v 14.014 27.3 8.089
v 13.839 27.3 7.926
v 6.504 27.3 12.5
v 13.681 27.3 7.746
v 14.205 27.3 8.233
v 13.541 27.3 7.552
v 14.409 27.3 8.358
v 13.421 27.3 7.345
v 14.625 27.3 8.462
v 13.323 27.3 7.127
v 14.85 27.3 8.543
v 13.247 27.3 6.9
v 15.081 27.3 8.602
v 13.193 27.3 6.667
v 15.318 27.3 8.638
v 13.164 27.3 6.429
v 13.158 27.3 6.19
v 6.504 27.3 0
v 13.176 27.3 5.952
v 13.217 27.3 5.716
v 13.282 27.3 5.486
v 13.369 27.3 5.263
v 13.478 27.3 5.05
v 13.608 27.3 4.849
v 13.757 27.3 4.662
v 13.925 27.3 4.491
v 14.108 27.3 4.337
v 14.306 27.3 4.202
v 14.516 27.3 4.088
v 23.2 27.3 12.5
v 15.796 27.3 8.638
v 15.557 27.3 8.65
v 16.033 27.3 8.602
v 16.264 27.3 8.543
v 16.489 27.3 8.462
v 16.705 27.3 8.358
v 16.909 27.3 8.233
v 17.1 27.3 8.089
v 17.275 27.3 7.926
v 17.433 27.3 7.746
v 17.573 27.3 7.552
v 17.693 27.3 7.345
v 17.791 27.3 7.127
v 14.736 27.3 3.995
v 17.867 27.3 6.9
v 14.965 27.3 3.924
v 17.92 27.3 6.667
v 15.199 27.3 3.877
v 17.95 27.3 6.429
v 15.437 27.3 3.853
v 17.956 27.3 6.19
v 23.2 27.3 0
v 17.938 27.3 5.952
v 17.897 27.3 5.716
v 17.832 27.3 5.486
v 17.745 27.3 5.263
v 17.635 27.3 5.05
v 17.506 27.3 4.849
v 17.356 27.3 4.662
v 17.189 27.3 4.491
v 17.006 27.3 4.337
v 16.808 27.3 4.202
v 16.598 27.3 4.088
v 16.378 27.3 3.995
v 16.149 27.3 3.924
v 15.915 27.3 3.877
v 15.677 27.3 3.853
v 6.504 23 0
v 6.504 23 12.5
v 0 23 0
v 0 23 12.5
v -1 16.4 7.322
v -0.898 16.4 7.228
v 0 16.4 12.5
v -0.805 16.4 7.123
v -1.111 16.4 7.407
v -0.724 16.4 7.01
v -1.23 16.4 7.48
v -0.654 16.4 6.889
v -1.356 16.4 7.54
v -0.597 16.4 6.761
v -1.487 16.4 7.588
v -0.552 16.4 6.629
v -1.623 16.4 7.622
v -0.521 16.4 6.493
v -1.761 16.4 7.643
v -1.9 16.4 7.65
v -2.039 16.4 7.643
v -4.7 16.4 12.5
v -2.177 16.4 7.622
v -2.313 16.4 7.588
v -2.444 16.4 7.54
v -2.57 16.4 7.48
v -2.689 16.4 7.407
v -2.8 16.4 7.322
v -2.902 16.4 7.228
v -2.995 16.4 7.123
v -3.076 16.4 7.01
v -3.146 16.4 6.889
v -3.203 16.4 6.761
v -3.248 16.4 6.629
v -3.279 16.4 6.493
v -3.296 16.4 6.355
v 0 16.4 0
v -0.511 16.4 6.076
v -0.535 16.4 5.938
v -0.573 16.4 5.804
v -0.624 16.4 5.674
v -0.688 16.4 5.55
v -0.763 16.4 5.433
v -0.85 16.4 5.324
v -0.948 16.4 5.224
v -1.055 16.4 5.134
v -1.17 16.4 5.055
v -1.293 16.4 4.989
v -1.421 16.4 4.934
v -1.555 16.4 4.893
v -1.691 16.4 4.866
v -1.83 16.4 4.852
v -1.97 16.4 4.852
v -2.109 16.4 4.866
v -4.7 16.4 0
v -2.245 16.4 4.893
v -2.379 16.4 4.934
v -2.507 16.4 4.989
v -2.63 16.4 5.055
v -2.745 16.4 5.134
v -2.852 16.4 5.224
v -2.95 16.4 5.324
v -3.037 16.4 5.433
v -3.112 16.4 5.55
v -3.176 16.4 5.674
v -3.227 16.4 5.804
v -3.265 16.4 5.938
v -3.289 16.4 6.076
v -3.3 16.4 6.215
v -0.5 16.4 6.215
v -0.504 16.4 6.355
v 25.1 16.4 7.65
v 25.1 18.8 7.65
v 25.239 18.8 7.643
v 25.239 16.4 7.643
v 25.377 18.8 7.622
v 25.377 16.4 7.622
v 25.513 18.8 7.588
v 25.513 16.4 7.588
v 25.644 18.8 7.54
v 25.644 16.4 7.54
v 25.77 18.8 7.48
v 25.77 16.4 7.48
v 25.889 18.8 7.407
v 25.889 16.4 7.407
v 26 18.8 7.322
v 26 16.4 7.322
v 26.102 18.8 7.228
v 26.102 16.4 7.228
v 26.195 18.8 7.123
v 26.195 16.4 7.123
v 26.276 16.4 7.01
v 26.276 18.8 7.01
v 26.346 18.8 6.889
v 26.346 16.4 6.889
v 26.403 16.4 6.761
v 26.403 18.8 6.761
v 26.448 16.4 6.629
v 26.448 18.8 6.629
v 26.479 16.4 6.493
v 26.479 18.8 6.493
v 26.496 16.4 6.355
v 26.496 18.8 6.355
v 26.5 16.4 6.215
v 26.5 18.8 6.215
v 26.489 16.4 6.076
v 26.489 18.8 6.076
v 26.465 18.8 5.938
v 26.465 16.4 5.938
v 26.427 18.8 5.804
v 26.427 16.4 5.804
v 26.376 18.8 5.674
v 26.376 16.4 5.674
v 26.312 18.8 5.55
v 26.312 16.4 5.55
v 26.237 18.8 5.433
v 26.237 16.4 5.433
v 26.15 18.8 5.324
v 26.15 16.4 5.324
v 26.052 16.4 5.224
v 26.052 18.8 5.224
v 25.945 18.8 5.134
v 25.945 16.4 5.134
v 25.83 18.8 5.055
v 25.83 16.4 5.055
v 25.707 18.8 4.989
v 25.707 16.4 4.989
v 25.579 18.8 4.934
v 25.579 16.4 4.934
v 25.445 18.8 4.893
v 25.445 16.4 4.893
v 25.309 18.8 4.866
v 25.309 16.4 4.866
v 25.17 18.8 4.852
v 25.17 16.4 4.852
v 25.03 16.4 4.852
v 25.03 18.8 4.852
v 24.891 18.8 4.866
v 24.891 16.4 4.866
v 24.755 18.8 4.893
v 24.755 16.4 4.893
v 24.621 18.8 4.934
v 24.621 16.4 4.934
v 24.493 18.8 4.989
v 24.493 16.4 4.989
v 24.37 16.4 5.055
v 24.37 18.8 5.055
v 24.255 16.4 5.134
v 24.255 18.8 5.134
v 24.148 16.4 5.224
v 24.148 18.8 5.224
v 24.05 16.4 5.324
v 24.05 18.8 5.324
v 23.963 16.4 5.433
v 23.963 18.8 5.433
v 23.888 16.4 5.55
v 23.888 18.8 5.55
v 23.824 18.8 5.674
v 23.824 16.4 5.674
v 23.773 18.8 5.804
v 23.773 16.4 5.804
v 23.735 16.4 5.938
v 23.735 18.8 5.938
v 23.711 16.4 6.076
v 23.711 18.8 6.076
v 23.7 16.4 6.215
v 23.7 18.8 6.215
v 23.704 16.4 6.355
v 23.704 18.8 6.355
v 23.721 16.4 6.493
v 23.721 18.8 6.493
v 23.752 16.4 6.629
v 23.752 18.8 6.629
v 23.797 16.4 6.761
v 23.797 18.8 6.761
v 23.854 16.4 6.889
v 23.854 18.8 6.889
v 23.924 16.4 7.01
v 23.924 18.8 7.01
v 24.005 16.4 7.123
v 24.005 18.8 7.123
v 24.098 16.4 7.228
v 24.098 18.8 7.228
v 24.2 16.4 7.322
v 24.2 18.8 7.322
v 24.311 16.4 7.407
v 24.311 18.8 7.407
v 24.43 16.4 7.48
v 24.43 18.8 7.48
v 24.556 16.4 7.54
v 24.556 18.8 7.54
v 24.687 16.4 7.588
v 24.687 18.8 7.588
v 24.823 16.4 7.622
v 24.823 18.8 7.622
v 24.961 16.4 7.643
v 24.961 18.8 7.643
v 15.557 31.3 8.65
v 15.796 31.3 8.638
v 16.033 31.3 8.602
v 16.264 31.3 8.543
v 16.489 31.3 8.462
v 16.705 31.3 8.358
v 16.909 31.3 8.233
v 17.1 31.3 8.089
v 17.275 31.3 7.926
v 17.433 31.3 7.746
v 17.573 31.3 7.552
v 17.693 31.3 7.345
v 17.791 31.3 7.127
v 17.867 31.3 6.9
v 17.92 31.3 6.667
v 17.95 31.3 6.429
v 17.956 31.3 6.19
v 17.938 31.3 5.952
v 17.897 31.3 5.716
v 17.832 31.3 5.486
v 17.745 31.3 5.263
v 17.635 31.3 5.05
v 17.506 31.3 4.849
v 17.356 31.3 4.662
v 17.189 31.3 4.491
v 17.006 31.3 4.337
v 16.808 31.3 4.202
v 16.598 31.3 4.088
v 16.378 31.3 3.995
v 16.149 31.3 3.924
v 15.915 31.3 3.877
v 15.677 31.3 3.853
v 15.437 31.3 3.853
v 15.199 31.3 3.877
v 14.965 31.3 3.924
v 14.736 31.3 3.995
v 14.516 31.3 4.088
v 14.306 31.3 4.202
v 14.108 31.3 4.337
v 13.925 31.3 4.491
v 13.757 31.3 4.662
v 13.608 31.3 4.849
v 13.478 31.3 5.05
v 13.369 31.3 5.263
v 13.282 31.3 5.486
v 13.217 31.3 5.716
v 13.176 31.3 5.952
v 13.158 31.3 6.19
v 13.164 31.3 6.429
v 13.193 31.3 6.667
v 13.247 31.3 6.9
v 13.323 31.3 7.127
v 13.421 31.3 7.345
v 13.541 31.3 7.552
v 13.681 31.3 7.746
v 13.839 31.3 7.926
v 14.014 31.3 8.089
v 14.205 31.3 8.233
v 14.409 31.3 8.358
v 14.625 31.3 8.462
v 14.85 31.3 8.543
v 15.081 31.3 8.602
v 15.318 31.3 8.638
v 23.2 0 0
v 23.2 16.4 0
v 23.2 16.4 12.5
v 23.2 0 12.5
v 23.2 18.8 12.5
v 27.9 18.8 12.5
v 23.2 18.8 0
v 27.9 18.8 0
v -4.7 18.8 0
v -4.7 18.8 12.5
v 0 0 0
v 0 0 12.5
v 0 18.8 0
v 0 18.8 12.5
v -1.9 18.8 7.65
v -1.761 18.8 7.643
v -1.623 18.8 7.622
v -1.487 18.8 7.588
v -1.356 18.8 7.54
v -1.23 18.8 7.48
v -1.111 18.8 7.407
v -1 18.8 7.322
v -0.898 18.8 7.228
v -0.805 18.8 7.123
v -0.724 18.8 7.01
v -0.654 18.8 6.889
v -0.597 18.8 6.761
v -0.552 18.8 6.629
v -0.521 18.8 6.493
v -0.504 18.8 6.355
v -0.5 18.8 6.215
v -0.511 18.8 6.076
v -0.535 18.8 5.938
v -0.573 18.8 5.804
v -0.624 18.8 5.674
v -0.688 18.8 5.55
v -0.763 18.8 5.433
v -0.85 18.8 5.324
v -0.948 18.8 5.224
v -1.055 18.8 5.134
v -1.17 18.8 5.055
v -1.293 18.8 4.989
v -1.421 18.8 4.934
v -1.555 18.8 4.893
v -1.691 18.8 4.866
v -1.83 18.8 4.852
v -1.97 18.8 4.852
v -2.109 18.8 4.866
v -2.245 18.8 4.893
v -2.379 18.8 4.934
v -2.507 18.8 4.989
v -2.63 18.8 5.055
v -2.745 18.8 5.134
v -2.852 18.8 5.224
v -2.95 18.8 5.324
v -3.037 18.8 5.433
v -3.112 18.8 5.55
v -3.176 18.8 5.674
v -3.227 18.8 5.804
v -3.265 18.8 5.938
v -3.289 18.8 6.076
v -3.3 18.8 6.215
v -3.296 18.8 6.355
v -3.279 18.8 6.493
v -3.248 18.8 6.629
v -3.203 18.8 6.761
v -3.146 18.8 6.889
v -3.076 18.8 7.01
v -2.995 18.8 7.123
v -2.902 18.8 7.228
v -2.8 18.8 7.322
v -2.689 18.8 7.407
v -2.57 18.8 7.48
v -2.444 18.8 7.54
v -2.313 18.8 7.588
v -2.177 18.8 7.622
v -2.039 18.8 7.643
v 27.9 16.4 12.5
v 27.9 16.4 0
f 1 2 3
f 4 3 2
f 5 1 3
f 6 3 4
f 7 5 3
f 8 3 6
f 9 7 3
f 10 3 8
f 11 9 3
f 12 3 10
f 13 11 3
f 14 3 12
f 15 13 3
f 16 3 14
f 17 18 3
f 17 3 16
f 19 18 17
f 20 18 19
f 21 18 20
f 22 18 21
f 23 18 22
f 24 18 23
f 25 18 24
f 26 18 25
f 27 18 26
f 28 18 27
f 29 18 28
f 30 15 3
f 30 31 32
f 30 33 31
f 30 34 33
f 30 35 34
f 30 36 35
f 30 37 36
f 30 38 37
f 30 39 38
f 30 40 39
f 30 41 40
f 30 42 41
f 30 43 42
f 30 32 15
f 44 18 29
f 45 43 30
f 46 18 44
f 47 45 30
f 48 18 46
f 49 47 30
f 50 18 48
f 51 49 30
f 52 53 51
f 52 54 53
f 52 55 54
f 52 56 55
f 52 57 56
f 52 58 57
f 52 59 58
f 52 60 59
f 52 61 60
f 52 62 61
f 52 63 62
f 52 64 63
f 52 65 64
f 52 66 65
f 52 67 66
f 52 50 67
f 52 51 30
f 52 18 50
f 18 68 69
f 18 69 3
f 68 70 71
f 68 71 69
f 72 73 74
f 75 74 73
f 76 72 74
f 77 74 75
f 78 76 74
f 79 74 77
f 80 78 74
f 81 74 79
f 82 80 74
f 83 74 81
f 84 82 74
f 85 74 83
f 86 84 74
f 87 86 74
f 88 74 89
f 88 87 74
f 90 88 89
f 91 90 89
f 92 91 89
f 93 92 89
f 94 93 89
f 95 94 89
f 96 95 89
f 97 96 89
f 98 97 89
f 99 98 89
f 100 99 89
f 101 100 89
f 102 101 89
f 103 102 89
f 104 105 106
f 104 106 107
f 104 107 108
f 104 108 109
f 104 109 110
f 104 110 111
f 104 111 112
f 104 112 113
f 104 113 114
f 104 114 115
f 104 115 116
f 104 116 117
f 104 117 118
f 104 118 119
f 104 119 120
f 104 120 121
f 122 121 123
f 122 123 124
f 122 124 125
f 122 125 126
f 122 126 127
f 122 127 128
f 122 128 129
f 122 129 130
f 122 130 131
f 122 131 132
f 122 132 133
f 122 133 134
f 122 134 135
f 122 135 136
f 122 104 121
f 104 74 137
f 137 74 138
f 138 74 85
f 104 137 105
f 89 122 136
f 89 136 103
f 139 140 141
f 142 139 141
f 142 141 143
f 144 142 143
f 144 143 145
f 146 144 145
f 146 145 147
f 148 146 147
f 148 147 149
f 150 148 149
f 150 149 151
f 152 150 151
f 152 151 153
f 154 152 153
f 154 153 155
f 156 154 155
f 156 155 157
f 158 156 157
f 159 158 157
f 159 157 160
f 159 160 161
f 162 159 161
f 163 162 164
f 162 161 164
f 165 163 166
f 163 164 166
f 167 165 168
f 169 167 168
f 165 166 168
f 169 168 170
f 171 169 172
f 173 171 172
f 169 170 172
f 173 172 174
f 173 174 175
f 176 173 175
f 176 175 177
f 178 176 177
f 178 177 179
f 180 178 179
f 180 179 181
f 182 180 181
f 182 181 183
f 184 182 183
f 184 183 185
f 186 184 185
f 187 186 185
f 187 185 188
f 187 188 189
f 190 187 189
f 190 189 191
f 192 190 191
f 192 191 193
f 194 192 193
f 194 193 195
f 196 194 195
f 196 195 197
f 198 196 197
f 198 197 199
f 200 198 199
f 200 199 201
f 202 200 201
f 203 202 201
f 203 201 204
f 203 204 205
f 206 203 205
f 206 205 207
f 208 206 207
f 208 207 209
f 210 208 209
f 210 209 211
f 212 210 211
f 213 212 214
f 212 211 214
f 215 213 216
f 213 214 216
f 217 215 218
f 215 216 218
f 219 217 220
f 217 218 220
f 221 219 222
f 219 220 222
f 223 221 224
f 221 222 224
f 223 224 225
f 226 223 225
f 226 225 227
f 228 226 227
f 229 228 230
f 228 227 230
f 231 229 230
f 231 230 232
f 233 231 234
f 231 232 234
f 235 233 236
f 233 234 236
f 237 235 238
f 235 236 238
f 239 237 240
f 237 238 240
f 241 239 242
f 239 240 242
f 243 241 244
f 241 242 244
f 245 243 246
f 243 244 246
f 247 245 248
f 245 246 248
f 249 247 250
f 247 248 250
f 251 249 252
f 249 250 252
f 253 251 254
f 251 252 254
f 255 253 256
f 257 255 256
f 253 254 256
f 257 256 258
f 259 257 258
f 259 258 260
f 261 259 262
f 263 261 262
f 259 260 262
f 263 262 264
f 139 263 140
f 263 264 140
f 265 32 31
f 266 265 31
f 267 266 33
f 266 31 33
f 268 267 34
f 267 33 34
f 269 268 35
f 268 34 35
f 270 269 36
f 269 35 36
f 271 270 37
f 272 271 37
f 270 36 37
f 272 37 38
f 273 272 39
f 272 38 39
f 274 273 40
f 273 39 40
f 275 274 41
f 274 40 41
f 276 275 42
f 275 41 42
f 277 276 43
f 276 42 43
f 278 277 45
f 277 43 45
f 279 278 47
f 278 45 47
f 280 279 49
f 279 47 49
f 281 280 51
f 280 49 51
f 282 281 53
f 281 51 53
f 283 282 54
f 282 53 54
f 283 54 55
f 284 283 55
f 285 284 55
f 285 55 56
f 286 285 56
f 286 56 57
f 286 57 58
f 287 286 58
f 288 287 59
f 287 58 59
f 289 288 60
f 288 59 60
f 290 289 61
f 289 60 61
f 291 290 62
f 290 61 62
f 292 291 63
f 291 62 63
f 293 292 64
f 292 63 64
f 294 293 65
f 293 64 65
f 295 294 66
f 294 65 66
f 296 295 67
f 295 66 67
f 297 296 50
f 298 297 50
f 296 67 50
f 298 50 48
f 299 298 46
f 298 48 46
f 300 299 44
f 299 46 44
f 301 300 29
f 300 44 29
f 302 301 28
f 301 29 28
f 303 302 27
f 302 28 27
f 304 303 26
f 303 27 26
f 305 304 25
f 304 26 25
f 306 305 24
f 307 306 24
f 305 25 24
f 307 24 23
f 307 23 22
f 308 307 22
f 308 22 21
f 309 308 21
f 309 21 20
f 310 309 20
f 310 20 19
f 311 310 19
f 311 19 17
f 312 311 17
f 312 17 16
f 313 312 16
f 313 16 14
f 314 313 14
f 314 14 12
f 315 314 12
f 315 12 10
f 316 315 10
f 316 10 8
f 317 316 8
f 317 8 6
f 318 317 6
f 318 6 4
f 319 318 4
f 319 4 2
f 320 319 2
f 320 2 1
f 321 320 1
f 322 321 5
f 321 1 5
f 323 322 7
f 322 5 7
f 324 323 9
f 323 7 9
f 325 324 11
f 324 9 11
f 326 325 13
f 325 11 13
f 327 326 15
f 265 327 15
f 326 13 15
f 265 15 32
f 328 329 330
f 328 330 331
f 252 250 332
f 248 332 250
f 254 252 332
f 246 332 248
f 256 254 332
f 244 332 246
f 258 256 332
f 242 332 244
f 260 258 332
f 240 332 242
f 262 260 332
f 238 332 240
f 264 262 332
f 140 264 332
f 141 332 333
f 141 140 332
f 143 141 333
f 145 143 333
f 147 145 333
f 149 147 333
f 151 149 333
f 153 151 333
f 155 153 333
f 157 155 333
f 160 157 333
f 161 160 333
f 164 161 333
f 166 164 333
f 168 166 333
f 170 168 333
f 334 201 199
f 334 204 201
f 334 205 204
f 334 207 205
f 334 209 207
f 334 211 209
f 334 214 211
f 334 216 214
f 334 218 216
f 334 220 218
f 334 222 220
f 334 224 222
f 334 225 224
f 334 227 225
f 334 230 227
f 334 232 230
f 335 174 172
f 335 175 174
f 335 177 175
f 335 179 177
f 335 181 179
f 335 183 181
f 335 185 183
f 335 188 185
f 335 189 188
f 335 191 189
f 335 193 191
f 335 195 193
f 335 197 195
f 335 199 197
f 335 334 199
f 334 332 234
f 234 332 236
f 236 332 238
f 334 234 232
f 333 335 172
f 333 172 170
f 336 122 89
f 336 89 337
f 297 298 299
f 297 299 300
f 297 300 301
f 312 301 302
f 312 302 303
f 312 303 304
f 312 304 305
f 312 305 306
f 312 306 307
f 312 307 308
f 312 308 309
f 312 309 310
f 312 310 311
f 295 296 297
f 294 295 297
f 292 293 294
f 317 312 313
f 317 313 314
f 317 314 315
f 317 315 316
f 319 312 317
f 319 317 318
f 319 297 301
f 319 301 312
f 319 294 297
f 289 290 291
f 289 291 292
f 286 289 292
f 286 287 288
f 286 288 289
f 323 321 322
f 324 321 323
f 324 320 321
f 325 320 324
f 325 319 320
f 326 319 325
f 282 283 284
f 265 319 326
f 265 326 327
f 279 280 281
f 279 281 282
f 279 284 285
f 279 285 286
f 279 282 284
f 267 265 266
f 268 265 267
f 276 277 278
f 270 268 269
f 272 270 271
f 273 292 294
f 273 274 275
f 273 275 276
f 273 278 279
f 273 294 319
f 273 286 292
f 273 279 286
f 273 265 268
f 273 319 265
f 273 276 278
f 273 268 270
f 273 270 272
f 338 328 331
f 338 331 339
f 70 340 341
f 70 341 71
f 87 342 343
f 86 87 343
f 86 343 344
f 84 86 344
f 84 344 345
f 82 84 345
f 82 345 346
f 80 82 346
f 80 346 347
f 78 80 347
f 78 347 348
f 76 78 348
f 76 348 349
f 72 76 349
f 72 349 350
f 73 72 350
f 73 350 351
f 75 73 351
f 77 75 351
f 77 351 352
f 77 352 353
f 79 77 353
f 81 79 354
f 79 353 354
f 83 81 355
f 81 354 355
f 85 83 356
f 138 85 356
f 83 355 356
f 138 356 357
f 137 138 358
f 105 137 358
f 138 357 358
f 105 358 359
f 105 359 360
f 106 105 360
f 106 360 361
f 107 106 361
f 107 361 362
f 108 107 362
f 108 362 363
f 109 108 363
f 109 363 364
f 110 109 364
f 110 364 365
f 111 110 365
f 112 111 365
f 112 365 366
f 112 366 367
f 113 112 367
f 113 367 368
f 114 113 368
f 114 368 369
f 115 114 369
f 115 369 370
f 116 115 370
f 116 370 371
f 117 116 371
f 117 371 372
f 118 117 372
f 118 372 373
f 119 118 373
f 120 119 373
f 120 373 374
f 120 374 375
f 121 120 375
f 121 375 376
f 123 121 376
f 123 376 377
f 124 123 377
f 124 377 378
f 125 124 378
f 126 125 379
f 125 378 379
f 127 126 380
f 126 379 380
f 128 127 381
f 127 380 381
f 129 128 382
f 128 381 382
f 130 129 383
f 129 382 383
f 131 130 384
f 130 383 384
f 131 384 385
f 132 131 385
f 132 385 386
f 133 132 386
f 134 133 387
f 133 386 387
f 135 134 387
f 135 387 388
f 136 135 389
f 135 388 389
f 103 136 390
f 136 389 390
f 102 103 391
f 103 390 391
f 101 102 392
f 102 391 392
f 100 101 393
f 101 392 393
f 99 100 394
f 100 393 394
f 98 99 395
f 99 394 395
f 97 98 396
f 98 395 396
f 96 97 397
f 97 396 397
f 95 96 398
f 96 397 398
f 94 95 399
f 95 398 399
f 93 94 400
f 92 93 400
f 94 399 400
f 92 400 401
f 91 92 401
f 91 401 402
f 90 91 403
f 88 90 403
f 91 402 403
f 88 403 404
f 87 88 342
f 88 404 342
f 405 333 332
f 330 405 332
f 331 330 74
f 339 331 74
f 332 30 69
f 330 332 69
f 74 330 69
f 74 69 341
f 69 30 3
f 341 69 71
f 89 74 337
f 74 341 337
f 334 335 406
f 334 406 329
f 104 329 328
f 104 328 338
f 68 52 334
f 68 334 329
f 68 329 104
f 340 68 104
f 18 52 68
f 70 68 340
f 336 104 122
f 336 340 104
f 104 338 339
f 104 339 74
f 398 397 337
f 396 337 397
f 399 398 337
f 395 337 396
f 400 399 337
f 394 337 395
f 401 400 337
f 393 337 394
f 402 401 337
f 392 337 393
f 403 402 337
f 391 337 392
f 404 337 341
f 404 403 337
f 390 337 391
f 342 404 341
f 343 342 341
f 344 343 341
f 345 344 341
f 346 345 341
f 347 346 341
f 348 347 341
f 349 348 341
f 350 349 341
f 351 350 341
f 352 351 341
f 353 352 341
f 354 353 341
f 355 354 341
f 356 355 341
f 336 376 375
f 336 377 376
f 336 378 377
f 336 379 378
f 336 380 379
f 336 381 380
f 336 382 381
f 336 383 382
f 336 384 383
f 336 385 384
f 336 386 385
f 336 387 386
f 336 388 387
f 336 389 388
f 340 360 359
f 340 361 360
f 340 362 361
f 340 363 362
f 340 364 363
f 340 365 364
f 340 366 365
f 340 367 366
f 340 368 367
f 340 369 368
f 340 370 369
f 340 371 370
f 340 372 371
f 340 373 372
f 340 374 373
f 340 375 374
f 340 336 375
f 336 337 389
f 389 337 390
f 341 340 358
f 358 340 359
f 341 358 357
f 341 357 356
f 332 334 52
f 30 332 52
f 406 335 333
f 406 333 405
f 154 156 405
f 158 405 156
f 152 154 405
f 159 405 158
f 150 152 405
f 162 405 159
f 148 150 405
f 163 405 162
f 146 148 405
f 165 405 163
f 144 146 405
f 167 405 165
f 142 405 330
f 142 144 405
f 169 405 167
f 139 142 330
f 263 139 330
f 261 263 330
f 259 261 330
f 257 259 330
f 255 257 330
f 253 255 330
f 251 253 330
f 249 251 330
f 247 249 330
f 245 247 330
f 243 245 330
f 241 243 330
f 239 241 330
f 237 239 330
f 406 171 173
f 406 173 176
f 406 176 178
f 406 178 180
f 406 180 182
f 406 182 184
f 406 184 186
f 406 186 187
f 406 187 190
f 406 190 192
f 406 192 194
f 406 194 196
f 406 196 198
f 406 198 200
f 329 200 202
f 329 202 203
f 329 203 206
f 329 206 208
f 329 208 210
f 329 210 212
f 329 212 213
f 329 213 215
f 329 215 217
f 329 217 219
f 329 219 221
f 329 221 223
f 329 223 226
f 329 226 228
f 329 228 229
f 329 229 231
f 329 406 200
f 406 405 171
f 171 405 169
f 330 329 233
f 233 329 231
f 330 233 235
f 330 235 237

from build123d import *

# Parameters (mm, degrees)
BOSS_EXTRUDE1_DEPTH = 12.5
SKETCH2_R           = 1.4
CUT_EXTRUDE1_DEPTH  = 12.5
SKETCH3_R           = 2.4
BOSS_EXTRUDE2_DEPTH = 4


with BuildPart() as part:
    # Sketch1 → Boss-Extrude1 (new body)
    with BuildSketch(Plane.XY):
        Polygon((0, 18.8), (0, 23), (6.504024825, 23), (6.504024825, 27.3), (23.2, 27.3), (23.2, 23), (23.2, 18.8), (27.9, 18.8), (27.9, 16.4), (23.2, 16.4), (23.2, 0), (0, 0), (0, 16.4), (-4.7, 16.4), (-4.7, 18.8), align=None)
    extrude(amount=BOSS_EXTRUDE1_DEPTH)

    # Sketch2 → Cut-Extrude1 (cut)
    with BuildSketch(Plane(origin=(0, 27.3, 0), x_dir=(1, 0, 0), z_dir=(0, 1, 0))):
        with Locations(Location((-1.9, -6.25, 0), (0, 0, 270))):
            Circle(SKETCH2_R)
        with Locations(Location((25.1, -6.25, 0), (0, 0, 270))):
            Circle(SKETCH2_R)
    extrude(amount=-CUT_EXTRUDE1_DEPTH, mode=Mode.SUBTRACT)

    # Sketch3 → Boss-Extrude2 (add)
    with BuildSketch(Plane(origin=(0, 27.3, 0), x_dir=(1, 0, 0), z_dir=(0, 1, 0))):
        with Locations(Location((15.556949647, -6.25, 0), (0, 0, 270))):
            Circle(SKETCH3_R)
    extrude(amount=BOSS_EXTRUDE2_DEPTH)


solid = part.part
